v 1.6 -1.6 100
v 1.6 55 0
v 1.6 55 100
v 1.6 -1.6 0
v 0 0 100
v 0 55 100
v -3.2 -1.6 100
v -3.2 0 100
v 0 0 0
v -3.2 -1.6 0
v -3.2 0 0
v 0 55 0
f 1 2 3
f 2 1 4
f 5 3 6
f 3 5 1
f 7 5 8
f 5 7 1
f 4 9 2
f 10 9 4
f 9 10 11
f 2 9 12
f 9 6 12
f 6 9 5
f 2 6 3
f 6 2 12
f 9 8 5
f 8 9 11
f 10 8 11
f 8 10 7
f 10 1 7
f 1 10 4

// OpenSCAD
dicke=1.6; //4 x 0.4mm Nozzle
tiefe=55; //?
hoehe=100;

cube([dicke,tiefe,hoehe]);

//Irgendeinen Halter daraus machen z.B. Stifte, Kopfhörer, Kabel, Kassette, ...

//Front
breite=dicke*2; //~3mm

translate([-breite,-dicke,0])
cube([breite+dicke, dicke, hoehe]);
